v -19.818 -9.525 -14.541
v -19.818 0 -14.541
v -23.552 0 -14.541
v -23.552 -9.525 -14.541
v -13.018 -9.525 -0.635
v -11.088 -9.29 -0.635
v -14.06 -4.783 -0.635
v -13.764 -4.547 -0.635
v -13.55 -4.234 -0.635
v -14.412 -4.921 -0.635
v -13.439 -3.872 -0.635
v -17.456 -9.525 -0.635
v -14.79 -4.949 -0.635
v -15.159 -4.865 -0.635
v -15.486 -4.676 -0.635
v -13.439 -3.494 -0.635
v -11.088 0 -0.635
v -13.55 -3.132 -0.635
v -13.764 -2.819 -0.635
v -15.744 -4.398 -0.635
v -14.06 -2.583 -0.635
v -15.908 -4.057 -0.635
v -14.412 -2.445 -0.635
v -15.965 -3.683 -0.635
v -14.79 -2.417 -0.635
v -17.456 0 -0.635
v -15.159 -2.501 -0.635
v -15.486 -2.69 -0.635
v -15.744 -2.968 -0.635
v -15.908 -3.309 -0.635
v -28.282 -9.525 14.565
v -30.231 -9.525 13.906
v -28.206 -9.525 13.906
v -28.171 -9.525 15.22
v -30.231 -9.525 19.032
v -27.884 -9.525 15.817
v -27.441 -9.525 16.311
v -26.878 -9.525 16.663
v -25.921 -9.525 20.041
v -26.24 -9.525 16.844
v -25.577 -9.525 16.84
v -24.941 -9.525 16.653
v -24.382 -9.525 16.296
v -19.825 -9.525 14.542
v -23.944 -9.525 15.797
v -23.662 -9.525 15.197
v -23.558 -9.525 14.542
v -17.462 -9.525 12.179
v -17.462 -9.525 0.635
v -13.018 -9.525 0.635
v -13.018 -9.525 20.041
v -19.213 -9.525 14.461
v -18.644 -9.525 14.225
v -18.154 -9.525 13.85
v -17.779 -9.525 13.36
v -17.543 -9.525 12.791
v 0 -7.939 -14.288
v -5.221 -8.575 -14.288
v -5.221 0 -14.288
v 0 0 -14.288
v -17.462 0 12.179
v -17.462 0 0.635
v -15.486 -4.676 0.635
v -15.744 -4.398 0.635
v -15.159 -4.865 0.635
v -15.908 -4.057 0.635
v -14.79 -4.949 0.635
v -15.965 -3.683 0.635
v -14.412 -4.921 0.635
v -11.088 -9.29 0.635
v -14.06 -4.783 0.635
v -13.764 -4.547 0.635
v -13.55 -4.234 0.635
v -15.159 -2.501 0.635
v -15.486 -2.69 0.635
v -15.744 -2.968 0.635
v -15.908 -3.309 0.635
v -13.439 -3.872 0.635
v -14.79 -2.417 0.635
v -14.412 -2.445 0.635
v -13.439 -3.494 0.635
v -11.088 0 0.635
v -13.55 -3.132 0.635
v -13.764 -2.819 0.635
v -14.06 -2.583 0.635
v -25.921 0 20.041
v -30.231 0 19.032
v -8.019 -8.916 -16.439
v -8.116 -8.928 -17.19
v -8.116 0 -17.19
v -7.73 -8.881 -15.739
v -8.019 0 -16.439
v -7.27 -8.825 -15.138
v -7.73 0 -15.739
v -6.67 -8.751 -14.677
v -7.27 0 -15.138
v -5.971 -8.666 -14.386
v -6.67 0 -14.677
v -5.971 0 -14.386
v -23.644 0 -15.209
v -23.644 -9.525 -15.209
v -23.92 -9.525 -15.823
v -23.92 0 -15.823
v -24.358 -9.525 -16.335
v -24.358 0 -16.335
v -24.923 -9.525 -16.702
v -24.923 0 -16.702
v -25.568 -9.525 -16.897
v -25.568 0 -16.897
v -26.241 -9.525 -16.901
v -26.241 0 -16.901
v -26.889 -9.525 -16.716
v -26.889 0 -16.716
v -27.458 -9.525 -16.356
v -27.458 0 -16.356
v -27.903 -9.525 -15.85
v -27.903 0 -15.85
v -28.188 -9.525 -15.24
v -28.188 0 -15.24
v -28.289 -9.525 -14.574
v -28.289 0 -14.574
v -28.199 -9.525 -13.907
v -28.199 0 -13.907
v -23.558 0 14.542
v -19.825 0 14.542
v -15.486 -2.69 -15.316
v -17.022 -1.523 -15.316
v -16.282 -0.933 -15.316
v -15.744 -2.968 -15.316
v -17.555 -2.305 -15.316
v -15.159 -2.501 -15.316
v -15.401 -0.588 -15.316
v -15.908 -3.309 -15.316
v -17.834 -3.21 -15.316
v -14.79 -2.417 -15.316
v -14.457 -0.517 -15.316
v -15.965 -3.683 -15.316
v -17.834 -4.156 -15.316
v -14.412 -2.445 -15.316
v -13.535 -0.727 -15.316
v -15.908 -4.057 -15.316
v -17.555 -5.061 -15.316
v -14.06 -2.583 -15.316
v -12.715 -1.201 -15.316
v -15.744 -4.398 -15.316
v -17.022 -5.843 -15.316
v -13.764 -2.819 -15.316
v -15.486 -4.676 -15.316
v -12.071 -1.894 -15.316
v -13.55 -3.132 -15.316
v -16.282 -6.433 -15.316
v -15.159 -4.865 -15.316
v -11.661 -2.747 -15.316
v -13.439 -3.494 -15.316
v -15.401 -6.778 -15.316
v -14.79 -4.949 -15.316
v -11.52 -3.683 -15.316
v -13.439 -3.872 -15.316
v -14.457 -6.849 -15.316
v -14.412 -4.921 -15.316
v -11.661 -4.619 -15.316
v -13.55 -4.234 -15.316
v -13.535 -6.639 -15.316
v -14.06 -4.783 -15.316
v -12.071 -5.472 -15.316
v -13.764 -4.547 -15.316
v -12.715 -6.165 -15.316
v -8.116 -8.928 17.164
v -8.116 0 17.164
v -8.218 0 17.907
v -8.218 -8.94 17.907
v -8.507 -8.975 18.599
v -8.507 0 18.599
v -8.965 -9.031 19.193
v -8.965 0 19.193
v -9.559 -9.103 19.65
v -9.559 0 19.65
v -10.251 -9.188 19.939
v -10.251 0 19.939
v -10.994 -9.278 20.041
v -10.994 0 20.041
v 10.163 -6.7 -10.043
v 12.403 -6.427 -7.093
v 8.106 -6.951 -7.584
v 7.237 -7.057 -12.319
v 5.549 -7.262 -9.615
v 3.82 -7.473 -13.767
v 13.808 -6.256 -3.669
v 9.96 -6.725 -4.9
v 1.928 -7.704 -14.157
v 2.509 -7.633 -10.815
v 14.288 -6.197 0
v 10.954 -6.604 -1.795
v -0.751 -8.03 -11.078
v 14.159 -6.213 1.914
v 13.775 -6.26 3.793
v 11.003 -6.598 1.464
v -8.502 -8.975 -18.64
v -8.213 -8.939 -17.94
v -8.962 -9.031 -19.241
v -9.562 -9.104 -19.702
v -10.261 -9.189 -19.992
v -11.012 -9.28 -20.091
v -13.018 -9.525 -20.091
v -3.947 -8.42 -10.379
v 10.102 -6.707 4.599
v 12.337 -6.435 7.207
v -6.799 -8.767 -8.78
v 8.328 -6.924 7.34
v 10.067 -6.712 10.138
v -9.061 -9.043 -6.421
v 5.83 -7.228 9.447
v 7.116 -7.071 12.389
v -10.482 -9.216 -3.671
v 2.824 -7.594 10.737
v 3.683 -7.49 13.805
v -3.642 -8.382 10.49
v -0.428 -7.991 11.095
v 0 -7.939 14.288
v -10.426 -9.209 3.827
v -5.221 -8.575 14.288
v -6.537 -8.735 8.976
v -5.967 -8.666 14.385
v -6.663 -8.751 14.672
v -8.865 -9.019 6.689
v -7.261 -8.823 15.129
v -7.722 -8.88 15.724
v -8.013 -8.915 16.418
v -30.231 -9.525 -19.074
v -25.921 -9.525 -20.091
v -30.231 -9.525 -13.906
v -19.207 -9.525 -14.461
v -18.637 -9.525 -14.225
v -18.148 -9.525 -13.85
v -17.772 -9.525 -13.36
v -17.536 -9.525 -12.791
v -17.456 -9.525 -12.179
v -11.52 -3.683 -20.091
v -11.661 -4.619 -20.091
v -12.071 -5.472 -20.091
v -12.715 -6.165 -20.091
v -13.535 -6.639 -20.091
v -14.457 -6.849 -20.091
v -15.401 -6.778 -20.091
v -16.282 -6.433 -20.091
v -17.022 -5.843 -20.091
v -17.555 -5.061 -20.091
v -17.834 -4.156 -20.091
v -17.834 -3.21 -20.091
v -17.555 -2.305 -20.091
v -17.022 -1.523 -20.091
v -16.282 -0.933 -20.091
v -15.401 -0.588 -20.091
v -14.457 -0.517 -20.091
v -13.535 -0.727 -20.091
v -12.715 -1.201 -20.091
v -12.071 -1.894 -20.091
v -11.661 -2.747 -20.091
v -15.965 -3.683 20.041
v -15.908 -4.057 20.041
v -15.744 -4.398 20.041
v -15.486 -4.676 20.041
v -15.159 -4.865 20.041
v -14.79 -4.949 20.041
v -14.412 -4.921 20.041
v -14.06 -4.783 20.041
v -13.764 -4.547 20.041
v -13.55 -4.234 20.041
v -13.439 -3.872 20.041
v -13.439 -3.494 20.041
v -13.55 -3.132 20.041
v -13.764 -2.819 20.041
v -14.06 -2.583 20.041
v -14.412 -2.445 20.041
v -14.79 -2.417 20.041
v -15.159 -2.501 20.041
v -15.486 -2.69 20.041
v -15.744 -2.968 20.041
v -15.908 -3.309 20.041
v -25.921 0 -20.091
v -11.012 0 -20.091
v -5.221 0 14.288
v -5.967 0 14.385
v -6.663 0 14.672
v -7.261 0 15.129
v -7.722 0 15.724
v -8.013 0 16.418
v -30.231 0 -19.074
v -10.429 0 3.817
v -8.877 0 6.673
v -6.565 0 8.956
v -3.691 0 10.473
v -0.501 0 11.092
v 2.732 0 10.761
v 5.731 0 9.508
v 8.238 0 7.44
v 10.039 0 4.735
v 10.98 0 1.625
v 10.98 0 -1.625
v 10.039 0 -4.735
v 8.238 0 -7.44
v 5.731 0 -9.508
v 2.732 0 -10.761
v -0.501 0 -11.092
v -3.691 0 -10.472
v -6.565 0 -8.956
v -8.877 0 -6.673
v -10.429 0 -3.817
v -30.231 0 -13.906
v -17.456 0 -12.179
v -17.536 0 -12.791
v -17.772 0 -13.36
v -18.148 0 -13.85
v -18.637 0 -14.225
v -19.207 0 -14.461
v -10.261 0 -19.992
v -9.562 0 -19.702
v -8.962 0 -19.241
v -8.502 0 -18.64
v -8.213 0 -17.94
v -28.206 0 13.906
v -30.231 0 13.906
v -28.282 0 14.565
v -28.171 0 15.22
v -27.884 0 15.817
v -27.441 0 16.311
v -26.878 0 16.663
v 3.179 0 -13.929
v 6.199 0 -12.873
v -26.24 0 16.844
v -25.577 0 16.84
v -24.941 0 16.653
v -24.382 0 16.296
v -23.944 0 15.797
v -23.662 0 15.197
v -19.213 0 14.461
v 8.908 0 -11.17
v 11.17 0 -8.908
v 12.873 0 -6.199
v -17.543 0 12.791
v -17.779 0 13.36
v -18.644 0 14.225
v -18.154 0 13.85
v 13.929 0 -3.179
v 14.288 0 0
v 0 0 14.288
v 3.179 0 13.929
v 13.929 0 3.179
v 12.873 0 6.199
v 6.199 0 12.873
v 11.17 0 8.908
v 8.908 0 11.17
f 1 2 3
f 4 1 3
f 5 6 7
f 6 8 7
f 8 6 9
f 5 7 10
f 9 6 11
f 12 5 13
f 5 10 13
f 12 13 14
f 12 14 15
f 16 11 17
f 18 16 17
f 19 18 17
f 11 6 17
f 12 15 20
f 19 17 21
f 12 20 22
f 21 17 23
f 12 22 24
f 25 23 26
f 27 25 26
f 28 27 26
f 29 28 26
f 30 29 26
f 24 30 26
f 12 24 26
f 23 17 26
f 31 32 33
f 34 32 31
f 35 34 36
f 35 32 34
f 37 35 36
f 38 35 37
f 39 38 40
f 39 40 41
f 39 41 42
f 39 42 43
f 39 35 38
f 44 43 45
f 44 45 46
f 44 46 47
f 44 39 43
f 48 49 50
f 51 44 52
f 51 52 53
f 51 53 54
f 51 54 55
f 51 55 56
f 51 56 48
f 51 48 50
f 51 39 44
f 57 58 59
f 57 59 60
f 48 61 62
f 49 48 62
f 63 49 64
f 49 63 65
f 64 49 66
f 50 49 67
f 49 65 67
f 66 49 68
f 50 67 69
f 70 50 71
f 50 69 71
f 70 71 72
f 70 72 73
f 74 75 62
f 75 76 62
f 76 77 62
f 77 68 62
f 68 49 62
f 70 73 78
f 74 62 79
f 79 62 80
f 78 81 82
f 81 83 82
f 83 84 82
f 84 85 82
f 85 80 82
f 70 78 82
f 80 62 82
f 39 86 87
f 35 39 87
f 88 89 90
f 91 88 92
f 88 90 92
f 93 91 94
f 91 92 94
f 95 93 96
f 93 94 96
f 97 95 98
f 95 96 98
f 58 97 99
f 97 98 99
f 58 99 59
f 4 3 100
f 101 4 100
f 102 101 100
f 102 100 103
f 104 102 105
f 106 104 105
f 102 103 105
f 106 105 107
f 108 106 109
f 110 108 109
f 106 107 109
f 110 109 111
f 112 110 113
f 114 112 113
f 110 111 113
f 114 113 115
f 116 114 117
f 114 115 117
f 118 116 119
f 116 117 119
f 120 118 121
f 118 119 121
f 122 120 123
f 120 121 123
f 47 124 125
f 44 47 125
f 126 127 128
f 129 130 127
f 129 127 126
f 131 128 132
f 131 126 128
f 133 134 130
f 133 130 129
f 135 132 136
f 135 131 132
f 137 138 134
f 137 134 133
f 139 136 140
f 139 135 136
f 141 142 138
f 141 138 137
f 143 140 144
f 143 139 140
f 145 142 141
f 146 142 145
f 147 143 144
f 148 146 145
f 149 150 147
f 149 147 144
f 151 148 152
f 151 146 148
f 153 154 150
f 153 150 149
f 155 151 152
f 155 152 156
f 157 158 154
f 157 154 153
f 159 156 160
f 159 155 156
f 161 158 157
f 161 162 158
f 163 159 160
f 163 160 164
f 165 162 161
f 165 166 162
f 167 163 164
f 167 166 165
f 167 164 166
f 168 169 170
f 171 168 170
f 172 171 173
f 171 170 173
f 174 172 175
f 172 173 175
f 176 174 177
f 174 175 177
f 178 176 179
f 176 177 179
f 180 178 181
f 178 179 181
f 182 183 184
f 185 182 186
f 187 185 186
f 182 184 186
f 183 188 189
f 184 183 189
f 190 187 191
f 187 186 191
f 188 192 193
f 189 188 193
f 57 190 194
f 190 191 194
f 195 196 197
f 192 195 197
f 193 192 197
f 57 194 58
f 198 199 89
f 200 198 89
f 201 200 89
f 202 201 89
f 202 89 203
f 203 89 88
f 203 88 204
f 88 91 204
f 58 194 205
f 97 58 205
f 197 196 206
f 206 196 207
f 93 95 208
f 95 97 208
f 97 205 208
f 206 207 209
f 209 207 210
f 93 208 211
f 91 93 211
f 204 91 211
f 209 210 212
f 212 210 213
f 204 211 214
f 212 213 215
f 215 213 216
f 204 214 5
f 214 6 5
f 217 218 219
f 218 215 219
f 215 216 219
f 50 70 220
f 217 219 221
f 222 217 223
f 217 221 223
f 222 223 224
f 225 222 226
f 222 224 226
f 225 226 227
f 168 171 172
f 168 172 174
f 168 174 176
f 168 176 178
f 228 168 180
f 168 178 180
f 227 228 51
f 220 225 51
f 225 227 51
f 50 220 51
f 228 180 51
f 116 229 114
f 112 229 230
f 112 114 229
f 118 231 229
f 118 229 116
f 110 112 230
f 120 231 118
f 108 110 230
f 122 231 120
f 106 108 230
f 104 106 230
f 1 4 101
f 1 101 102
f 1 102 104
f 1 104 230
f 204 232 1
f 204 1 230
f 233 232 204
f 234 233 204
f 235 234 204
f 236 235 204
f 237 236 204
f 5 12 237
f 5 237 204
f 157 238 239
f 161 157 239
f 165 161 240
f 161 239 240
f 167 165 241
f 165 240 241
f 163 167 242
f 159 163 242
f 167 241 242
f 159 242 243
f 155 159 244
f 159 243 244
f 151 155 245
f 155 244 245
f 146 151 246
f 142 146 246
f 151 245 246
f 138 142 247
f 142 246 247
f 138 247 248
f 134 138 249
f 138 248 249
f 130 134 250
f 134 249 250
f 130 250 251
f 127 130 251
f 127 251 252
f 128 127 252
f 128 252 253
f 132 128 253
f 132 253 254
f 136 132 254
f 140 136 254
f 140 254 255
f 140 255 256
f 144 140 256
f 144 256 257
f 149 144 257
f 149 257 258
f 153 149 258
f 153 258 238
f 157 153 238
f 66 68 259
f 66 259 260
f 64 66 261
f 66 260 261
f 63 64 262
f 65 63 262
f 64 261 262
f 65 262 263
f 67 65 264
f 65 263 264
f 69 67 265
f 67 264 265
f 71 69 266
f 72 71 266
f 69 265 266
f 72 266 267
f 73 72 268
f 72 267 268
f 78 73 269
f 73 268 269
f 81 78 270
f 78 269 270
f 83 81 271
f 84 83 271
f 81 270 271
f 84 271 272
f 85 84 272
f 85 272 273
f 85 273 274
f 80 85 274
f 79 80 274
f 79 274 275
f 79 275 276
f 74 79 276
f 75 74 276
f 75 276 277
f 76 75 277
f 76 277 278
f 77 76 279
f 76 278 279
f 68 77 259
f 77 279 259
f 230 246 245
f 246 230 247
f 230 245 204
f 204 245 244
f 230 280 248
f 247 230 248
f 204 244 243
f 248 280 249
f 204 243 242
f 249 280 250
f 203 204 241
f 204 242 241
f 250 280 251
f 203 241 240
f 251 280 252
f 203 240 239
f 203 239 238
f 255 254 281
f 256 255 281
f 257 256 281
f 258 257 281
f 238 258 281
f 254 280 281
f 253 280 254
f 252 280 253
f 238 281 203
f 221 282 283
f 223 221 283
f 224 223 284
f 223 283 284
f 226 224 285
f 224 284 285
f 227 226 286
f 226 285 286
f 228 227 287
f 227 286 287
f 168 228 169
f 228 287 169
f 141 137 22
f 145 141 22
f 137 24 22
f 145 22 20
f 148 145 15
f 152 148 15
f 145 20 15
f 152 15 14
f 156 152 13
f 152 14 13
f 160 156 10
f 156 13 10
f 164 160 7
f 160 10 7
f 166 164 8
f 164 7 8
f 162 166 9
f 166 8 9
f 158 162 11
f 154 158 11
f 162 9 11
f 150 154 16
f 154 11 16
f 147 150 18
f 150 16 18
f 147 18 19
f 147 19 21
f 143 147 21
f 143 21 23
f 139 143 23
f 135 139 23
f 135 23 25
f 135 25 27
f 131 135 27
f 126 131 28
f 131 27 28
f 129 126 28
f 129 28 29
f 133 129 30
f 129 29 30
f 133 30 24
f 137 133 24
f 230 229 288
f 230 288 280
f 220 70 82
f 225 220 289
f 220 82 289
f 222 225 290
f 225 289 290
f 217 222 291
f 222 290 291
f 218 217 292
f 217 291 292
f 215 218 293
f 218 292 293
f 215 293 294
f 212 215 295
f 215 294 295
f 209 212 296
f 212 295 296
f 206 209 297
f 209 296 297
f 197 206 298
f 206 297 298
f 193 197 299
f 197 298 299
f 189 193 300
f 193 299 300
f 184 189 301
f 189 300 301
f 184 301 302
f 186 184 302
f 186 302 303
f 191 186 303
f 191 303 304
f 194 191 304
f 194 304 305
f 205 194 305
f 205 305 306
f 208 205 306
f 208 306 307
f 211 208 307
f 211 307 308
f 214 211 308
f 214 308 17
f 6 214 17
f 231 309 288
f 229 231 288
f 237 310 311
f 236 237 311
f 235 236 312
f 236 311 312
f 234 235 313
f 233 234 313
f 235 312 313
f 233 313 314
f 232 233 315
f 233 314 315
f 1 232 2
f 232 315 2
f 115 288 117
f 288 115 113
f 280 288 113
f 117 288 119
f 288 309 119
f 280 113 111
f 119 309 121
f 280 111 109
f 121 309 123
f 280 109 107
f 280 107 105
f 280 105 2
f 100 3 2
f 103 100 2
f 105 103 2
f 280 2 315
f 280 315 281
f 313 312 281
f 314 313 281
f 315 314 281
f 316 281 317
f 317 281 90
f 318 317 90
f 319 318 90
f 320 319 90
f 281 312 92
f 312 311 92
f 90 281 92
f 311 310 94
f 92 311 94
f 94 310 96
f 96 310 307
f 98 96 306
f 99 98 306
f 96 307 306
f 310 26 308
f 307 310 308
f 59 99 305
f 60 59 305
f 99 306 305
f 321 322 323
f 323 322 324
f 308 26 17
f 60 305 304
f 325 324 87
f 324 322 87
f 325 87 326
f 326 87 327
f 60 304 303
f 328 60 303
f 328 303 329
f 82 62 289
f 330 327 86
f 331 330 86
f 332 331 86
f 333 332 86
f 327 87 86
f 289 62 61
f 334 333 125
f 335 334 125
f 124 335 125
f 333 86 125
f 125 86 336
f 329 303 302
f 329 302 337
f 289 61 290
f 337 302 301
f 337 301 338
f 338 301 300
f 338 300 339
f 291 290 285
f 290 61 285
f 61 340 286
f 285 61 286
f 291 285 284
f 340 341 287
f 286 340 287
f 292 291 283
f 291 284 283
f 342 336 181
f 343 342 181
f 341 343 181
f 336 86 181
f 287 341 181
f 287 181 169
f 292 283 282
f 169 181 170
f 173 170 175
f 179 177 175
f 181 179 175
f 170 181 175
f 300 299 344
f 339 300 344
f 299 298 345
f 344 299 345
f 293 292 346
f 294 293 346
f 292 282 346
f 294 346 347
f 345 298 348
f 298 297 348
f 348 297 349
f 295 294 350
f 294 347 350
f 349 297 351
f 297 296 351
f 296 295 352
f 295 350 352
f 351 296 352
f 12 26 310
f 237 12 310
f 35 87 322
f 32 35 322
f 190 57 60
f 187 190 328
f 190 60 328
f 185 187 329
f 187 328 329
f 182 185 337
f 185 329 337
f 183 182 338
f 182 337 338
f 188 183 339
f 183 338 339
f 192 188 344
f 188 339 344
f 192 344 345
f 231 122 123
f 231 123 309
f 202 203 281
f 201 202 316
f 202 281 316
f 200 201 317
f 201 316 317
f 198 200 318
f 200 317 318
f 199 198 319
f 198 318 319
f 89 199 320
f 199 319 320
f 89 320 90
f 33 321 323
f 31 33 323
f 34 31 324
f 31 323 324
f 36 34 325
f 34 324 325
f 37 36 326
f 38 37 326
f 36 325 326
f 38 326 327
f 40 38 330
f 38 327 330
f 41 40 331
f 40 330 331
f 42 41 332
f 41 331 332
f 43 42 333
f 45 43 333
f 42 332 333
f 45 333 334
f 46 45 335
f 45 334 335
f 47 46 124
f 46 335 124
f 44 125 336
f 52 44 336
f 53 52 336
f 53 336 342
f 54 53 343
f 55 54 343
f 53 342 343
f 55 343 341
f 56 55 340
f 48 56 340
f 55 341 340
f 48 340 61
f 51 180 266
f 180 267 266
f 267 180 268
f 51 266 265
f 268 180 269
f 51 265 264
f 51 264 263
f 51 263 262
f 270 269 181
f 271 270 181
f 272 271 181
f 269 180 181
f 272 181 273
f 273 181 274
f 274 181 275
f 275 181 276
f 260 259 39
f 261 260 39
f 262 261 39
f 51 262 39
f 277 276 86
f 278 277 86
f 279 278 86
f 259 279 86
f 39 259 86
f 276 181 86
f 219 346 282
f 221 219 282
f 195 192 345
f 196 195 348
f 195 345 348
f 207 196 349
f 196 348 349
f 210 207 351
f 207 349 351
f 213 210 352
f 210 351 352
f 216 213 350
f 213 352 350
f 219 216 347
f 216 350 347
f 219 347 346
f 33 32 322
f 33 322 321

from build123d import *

# Parameters (mm, degrees)
F1_DEPTH       = 9.525
F3_D           = 2.54
F3_CBORE_D     = 6.35
F3_CBORE_DEPTH = 4.7752
F5_DEPTH       = 20.32


with BuildPart() as f1:
    # F0 (on Front) → F1 (new body)
    with BuildSketch(Plane.XZ):
        with BuildLine():
            ThreePointArc((-28.2059340648, 13.9065), (-26.240179578, 16.8438540599), (-23.5585, 14.5415))
            Line((-23.5585, 14.5415), (-19.8247, 14.5415))
            ThreePointArc((-19.8247, 14.5415), (-18.1543723615, 13.8496276385), (-17.4625, 12.1793))
            Line((-17.4625, 12.1793), (-17.4625, 0.6350352715))
            Line((-17.4625, 0.6350352715), (-11.0877819096, 0.6350352715))
            ThreePointArc((-11.0877819096, 0.6350352715), (11.0996948974, 3.52715e-05), (-11.0877819096, -0.6349647285))
            Line((-11.0877819096, -0.6349647285), (-17.4559396015, -0.6349647285))
            Line((-17.4559396015, -0.6349647285), (-17.4559396015, -12.1792647285))
            ThreePointArc((-17.4559396015, -12.1792647285), (-18.147811963, -13.8495923671), (-19.8181396015, -14.5414647285))
            Line((-19.8181396015, -14.5414647285), (-23.5519396015, -14.5414647285))
            ThreePointArc((-23.5519396015, -14.5414647285), (-26.2413382061, -16.9011545192), (-28.1991546105, -13.9065))
            Line((-28.1991546105, -13.9065), (-30.2311546105, -13.9065))
            Line((-30.2311546105, -13.9065), (-30.2311546105, -19.0742111302))
            Line((-30.2311546105, -19.0742111302), (-25.92066586, -20.0914))
            Line((-25.92066586, -20.0914), (-11.0116051104, -20.0914))
            ThreePointArc((-11.0116051104, -20.0914), (-8.9619217104, -19.2410649878), (-8.116123004, -17.1895055269))
            ThreePointArc((-8.116123004, -17.1895055269), (-7.2702919293, -15.137867554), (-5.220530089, -14.2875))
            Line((-5.220530089, -14.2875), (0, -14.2875))
            ThreePointArc((0, -14.2875), (10.1027881362, -10.1027881362), (14.2875, 0))
            ThreePointArc((14.2875, 0), (10.1027881362, 10.1027881362), (0, 14.2875))
            Line((0, 14.2875), (-5.220530089, 14.2875))
            ThreePointArc((-5.220530089, 14.2875), (-7.2612916673, 15.1288868805), (-8.1160675997, 17.1640767507))
            ThreePointArc((-8.1160675997, 17.1640767507), (-8.9646092373, 19.1930542961), (-10.9940030066, 20.0406))
            Line((-10.9940030066, 20.0406), (-25.92066586, 20.0406))
            Line((-25.92066586, 20.0406), (-30.2311546105, 19.0322602705))
            Line((-30.2311546105, 19.0322602705), (-30.2311546105, 13.9065))
            Line((-30.2311546105, 13.9065), (-28.2059340648, 13.9065))
        make_face()
    extrude(amount=F1_DEPTH)

    # F3 (through all)
    with Locations(Plane(origin=(0, 0, -20.0914), x_dir=(1, 0, 0), z_dir=(0, 0, -1))):
        with Locations((-14.6946051104, 3.683)):
            CounterBoreHole(F3_D / 2, F3_CBORE_D / 2, F3_CBORE_DEPTH)

    # F4 (on Top) → F5 (cut, symmetric)
    with BuildSketch(Plane.XY):
        Polygon((14.5003534853, -6.1715153816), (-13.6252772063, -9.5990113914), (14.5003534853, -10.0196320564), align=None)
    extrude(amount=F5_DEPTH, both=True, mode=Mode.SUBTRACT)


solid = f1.part
